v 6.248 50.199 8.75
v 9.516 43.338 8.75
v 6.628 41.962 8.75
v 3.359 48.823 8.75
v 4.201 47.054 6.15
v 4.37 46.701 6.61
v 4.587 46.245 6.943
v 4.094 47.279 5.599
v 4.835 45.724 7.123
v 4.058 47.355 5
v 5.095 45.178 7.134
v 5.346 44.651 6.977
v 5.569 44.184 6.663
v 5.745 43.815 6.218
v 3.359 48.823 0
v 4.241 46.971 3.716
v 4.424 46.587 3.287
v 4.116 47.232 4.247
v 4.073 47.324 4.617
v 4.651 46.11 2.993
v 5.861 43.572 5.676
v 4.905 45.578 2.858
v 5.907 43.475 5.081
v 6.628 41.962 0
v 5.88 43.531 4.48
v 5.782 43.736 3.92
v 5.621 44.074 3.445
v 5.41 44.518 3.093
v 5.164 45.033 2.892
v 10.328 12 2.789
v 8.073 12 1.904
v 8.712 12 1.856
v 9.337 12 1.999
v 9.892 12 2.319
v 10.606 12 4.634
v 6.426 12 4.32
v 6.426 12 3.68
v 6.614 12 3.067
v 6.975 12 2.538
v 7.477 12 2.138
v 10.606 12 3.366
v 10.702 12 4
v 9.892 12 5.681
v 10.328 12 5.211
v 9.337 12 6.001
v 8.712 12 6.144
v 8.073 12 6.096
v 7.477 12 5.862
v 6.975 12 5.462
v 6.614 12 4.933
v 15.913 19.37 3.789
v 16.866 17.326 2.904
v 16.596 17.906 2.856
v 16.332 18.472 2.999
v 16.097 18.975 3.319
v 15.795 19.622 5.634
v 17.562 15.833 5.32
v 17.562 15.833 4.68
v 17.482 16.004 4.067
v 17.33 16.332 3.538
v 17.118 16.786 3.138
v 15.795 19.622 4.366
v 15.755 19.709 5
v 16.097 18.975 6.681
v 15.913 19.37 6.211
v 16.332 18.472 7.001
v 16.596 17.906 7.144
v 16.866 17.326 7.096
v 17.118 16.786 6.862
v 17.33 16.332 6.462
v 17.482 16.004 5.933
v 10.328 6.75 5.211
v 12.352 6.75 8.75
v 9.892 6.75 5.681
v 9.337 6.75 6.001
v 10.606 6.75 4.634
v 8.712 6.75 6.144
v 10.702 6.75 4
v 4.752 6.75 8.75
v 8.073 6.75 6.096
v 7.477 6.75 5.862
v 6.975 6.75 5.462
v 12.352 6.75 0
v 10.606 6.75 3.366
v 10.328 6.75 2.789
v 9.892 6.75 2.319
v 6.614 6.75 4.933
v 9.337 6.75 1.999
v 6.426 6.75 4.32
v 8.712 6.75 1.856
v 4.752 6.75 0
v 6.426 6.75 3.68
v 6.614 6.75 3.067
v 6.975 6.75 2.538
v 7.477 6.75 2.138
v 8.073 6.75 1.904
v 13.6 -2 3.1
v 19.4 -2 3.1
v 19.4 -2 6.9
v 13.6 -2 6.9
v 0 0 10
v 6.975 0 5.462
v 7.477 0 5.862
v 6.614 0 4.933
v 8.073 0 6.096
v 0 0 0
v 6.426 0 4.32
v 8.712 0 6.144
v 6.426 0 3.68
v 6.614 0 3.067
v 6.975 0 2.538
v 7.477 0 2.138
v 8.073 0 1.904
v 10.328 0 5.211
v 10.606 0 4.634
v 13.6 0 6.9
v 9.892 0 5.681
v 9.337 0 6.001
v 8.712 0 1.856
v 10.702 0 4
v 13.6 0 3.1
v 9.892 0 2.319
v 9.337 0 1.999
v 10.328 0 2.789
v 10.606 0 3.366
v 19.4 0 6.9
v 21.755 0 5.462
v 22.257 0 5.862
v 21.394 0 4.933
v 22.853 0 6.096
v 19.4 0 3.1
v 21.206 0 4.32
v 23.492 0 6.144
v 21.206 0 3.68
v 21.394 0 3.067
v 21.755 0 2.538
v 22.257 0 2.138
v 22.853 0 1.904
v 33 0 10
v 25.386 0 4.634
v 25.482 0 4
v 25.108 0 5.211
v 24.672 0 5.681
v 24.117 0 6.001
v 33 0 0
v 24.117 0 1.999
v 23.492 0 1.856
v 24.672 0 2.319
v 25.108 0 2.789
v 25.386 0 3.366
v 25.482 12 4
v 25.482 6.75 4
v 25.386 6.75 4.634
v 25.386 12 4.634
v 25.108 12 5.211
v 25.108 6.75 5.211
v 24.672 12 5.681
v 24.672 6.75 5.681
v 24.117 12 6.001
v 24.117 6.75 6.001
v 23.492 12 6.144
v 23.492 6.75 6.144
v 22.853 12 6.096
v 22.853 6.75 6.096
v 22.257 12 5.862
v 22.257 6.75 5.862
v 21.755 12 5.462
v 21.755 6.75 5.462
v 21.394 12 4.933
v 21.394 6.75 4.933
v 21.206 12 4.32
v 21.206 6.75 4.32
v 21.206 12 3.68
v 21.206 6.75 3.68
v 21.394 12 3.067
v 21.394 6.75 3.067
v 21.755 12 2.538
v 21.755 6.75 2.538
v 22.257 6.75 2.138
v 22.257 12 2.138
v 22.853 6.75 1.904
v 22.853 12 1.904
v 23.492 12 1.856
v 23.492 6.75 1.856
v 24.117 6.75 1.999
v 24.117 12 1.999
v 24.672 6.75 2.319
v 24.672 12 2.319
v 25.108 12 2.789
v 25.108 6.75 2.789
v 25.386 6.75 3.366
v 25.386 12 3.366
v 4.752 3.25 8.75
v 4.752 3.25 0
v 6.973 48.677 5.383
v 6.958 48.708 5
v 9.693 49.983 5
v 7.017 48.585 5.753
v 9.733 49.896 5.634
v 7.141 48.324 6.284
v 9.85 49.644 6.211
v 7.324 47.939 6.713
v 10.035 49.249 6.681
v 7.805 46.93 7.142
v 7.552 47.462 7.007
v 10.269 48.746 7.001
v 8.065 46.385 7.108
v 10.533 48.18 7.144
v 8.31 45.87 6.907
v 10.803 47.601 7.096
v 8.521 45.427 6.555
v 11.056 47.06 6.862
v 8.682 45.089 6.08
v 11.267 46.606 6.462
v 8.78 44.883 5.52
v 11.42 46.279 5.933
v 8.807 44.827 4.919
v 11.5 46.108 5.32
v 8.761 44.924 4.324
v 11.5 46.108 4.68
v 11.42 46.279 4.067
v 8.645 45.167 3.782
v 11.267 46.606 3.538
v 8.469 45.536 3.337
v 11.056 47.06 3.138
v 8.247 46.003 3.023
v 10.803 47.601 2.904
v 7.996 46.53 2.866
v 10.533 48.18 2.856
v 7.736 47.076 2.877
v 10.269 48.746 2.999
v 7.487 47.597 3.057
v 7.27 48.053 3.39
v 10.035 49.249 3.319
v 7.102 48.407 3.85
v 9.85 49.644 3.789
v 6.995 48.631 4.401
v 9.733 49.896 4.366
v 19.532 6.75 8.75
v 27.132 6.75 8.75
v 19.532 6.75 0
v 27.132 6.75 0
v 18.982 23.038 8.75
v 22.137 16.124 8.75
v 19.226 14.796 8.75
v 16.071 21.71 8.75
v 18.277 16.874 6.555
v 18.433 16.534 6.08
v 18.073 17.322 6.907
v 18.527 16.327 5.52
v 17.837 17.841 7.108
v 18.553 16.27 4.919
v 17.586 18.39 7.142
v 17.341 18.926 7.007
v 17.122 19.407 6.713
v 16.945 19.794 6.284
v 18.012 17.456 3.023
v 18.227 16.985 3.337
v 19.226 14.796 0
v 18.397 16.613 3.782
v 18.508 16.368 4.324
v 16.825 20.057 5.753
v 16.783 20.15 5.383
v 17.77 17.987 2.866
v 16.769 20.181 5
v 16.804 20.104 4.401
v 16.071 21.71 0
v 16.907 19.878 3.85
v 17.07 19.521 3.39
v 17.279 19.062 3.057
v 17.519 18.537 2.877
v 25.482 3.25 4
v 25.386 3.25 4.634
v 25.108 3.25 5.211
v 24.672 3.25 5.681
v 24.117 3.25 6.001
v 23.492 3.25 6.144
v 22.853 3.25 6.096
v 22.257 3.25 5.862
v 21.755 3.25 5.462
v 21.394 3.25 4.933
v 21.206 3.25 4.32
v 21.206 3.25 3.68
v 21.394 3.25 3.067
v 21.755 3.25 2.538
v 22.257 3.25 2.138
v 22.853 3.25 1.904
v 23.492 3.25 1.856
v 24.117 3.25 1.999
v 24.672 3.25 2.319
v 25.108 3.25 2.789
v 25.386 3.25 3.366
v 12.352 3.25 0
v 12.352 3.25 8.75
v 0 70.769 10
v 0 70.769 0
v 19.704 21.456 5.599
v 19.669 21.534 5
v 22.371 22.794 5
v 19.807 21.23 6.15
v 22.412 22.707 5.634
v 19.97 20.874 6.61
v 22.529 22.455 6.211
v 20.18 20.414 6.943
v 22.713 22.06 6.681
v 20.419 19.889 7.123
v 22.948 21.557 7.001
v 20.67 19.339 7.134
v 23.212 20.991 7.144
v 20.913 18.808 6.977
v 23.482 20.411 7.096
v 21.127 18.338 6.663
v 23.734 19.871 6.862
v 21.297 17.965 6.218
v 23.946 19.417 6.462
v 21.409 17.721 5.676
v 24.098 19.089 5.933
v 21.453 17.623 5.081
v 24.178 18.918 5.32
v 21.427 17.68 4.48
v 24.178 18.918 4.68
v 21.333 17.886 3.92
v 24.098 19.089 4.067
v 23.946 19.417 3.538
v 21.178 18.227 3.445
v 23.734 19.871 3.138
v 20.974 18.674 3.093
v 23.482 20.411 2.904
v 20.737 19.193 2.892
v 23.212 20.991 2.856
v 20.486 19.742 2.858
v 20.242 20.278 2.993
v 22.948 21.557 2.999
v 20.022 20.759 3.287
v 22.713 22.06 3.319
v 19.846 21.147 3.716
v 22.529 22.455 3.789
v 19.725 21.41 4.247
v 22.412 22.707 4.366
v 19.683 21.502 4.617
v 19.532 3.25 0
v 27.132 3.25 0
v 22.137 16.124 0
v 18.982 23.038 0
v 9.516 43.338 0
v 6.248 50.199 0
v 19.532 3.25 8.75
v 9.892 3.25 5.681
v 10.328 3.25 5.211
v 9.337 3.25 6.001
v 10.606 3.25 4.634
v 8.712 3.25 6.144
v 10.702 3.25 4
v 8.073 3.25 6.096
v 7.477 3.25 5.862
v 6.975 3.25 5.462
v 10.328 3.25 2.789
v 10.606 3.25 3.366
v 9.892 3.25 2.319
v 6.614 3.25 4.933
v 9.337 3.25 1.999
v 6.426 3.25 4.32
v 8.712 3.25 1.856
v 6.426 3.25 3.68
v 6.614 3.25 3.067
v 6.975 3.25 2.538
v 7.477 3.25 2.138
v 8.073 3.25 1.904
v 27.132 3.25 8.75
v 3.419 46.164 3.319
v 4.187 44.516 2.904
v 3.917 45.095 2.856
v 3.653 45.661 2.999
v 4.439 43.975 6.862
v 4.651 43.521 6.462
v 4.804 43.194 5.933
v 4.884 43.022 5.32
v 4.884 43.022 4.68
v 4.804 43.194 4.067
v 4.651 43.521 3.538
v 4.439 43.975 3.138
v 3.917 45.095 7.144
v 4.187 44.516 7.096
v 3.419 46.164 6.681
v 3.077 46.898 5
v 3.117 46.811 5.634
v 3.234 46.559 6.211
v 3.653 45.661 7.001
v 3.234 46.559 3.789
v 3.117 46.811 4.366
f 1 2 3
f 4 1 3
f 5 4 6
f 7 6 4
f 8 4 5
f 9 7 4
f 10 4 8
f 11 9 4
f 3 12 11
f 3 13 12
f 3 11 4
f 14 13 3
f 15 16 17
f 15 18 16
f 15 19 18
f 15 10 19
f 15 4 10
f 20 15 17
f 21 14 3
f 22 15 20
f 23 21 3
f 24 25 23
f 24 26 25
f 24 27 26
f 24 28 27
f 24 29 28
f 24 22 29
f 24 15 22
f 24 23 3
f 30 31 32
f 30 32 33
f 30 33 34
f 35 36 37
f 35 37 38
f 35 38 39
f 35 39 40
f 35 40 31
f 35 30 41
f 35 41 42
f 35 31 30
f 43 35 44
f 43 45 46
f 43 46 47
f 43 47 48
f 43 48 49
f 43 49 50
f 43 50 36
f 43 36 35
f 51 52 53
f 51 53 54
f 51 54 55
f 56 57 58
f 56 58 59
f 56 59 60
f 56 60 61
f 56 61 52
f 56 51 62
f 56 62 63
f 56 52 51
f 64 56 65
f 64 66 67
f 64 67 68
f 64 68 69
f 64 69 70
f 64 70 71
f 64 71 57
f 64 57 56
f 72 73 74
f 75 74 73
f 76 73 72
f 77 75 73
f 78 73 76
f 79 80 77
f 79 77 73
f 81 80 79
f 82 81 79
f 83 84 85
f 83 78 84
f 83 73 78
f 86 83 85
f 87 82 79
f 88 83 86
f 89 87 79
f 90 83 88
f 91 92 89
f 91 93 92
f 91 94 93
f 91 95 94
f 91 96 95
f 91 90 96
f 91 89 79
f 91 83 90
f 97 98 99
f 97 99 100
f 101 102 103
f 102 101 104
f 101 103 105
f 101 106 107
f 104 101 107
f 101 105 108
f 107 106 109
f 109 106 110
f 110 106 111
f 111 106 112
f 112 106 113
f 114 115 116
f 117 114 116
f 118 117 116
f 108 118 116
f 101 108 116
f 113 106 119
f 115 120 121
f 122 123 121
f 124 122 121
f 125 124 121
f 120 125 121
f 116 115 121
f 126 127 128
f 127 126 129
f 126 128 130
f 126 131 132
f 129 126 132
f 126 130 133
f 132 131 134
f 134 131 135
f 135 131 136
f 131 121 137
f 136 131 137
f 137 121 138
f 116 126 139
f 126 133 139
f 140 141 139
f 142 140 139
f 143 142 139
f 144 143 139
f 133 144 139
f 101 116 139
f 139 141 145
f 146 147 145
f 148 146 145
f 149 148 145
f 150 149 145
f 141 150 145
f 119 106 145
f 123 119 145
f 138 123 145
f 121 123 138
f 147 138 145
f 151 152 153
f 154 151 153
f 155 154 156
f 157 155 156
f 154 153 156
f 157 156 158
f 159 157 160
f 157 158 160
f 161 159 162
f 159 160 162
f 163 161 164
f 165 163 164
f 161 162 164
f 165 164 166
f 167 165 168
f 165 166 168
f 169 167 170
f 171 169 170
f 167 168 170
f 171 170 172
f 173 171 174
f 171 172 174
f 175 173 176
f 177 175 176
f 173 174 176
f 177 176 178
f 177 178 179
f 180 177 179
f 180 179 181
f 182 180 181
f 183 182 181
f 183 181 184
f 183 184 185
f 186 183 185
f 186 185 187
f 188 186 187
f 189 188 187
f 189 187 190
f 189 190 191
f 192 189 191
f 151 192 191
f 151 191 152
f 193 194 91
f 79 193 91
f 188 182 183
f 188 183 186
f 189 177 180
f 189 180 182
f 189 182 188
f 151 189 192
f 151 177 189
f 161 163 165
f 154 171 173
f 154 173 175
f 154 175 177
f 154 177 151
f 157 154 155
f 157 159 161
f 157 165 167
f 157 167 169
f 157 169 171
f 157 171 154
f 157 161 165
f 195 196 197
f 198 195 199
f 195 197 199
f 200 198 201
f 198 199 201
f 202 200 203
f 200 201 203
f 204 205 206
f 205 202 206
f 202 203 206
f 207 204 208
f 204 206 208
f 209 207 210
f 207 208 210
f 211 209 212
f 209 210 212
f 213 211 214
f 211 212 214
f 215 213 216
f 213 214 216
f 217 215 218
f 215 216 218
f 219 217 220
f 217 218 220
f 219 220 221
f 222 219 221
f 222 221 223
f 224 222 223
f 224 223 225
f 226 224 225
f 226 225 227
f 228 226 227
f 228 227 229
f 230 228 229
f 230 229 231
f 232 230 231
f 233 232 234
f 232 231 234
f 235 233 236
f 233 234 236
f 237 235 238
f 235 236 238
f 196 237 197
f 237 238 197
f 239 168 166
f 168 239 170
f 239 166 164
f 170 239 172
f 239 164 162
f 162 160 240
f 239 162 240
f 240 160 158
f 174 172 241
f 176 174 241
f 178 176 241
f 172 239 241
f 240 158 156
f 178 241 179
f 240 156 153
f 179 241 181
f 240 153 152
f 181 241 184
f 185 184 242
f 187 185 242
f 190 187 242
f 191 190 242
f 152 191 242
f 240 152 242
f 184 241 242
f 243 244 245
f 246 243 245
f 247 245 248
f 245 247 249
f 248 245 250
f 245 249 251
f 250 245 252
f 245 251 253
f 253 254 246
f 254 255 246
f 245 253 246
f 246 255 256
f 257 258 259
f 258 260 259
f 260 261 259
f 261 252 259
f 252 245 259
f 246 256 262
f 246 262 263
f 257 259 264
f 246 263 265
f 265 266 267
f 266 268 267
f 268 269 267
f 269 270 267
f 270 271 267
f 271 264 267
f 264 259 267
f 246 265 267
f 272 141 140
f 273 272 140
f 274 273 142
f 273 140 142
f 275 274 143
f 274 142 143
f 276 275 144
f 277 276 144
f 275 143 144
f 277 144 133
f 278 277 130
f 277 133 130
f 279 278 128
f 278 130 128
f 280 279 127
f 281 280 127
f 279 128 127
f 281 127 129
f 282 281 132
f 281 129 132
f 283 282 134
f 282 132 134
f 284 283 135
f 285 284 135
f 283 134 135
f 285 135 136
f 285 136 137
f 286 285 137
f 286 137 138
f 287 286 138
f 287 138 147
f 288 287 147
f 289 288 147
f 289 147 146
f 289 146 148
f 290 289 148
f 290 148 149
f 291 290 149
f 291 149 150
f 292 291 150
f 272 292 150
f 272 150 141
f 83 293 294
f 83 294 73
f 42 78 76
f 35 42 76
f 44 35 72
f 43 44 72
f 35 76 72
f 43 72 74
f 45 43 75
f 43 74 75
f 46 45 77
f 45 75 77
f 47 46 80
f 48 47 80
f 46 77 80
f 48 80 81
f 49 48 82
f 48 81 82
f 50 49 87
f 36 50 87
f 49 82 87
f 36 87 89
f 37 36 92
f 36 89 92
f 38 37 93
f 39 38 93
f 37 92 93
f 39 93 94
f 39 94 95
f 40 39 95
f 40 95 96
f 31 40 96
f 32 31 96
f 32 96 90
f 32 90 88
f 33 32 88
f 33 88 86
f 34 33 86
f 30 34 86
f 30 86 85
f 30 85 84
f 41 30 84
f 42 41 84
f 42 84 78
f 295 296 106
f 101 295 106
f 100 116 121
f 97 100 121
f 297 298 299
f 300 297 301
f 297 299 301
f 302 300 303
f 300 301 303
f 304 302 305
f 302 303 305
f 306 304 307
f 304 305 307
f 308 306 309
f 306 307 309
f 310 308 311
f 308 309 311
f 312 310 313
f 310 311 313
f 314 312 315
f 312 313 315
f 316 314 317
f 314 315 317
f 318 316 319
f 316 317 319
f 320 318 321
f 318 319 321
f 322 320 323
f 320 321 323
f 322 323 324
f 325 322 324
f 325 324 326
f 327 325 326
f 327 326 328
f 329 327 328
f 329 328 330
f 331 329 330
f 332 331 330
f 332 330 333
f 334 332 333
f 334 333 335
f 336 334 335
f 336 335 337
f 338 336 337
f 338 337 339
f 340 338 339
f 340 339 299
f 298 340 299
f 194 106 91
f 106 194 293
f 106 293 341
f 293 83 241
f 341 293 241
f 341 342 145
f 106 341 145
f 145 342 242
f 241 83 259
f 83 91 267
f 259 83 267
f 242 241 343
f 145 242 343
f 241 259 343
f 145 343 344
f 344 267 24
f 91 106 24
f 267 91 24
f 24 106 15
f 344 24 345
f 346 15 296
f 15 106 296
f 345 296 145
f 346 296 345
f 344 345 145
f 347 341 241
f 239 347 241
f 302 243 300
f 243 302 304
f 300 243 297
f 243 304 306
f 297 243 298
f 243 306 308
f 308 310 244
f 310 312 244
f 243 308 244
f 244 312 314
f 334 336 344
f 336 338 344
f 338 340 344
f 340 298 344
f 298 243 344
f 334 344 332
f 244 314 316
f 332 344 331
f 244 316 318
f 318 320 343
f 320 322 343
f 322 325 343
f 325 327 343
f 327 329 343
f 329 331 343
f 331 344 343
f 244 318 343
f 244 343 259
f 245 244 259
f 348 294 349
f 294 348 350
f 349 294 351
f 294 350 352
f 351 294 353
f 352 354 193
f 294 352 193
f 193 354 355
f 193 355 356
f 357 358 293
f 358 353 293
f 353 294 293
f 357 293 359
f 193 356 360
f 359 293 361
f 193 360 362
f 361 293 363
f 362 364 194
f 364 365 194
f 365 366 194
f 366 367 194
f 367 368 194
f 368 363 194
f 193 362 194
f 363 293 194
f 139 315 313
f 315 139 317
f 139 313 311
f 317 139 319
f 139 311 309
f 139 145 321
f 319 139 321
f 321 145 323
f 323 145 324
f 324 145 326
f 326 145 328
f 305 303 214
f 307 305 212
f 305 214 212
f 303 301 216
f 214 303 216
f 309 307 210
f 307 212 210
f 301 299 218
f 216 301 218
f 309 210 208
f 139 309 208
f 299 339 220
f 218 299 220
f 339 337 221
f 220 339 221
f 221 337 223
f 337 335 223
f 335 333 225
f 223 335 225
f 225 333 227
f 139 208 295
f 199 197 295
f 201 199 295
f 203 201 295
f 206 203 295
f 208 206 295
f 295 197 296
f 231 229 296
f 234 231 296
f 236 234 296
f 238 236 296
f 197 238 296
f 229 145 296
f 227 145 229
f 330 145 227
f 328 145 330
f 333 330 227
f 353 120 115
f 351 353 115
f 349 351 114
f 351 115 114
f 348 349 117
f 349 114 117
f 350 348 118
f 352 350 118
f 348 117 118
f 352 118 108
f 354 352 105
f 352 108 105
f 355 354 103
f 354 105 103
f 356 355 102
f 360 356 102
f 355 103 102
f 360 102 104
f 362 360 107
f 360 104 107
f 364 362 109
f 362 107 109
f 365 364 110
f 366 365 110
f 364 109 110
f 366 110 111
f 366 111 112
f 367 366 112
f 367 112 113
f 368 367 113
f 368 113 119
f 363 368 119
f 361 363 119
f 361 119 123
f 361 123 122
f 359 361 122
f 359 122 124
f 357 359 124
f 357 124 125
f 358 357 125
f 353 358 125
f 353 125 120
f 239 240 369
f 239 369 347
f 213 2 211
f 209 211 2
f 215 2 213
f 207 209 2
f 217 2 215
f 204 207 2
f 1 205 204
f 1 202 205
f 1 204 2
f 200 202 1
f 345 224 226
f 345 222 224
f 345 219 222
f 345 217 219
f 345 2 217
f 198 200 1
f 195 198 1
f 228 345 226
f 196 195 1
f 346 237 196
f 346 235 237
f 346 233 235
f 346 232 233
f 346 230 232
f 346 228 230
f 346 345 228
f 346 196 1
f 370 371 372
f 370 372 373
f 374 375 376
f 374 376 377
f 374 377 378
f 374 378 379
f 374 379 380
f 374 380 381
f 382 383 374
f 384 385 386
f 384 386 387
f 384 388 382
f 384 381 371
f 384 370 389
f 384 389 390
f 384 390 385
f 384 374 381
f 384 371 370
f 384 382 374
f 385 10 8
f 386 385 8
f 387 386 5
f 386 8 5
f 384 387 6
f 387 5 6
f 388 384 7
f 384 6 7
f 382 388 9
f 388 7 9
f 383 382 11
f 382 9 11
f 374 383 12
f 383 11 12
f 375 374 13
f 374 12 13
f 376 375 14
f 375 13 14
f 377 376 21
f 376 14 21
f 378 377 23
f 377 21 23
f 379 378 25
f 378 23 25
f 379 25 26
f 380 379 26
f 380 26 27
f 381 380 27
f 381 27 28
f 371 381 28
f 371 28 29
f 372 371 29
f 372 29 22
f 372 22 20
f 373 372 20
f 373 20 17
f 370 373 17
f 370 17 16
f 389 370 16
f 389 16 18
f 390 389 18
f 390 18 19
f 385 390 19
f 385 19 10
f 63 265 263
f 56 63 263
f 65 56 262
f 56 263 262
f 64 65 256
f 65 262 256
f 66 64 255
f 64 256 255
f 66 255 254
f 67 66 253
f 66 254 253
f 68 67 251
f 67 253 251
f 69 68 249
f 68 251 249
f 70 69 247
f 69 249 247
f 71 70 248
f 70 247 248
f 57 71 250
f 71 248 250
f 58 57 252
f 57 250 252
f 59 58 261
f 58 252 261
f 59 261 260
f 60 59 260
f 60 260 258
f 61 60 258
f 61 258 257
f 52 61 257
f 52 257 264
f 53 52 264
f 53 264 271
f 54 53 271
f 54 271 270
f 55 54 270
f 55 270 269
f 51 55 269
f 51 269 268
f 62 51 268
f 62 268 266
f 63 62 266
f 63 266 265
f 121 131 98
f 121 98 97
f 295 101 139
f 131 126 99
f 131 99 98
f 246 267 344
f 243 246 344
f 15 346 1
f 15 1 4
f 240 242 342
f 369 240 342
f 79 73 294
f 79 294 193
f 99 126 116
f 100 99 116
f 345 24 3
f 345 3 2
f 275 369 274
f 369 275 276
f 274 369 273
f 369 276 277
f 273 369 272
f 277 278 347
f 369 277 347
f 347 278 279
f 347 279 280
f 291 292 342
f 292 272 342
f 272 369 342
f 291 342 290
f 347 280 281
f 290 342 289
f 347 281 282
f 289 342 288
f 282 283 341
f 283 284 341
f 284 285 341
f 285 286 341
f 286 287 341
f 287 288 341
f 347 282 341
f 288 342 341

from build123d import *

# Parameters (mm, degrees)
BOSS_EXTRUDE1_DEPTH = 10
SKETCH2_W           = 5.8
SKETCH2_H           = 3.8
BOSS_EXTRUDE2_DEPTH = 2
SKETCH3_R           = 2.15
CUT_EXTRUDE1_DEPTH  = 12
CUT_EXTRUDE2_DEPTH  = 6.5
SKETCH5_W           = 7.6
SKETCH5_H           = 3.5
CUT_EXTRUDE3_DEPTH  = 6.5
SKETCH6_R           = 2.15
CUT_EXTRUDE4_DEPTH  = 7.3
CUT_EXTRUDE5_START  = -10
CUT_EXTRUDE5_DEPTH  = 7.5
SKETCH8_W           = 7.6
SKETCH8_H           = 3.5
CUT_EXTRUDE6_DEPTH  = 8.75


with BuildPart() as part:
    # Sketch1 → Boss-Extrude1 (new body)
    with BuildSketch(Plane.XY):
        Polygon((0, 70.768728377), (0, 0), (33, 0), align=None)
    extrude(amount=BOSS_EXTRUDE1_DEPTH)

    # Sketch2 → Boss-Extrude2 (add)
    with BuildSketch(Plane(origin=(0, 0, 0), x_dir=(-1, 0, 0), z_dir=(0, -1, 0))):
        with Locations((-16.5, -5)):
            Rectangle(SKETCH2_W, SKETCH2_H)
    extrude(amount=BOSS_EXTRUDE2_DEPTH)

    # Sketch3 → Cut-Extrude1 (cut)
    with BuildSketch(Plane(origin=(0, 0, 0), x_dir=(-1, 0, 0), z_dir=(0, -1, 0))):
        with Locations(Location((-23.331538291, -4, 0), (0, 0, 180))):
            Circle(SKETCH3_R)
        with Locations(Location((-8.551538291, -4, 0), (0, 0, 180))):
            Circle(SKETCH3_R)
    extrude(amount=-CUT_EXTRUDE1_DEPTH, mode=Mode.SUBTRACT)

    # Sketch4 → Cut-Extrude2 (cut)
    with BuildSketch(Plane(origin=(0, 0, 0), x_dir=(-1, 0, 0), z_dir=(0, 0, -1))):
        Polygon((-19.531538291, 3.25), (-19.531538291, 5), (-19.531538291, 6.75), (-27.131538291, 6.75), (-27.131538291, 5), (-27.131538291, 3.25), align=None)
    extrude(amount=-CUT_EXTRUDE2_DEPTH, mode=Mode.SUBTRACT)

    # Sketch5 → Cut-Extrude3 (cut)
    with BuildSketch(Plane(origin=(0, 0, 0), x_dir=(-1, 0, 0), z_dir=(0, 0, -1))):
        with Locations((-23.331538291, 5)):
            Rectangle(SKETCH5_W, SKETCH5_H)
        with Locations((-8.551538291, 5)):
            Rectangle(SKETCH5_W, SKETCH5_H)
    extrude(amount=-CUT_EXTRUDE3_DEPTH, mode=Mode.SUBTRACT)

    # Sketch6 → Cut-Extrude4 (cut)
    with BuildSketch(Plane(origin=(27.10599556, 12.639733311, 0), x_dir=(0, 0, -1), z_dir=(0.9063077870366479, 0.422618261740704, 0))):
        with Locations(Location((-5, 9.053597363, 0), (0, 0, 90))):
            Circle(SKETCH6_R)
        with Locations(Location((-5, 39.053597363, 0), (0, 0, 90))):
            Circle(SKETCH6_R)
    extrude(amount=-CUT_EXTRUDE4_DEPTH, mode=Mode.SUBTRACT)

    # Sketch7 → Cut-Extrude5 (cut)
    with BuildSketch(Plane.XY.offset(10).offset(CUT_EXTRUDE5_START)):
        Polygon((6.247556837, 50.199361906), (3.358673988, 48.823005888), (6.627519532, 41.961909123), (9.51640238, 43.338265141), align=None)
        Polygon((18.982454602, 23.03825064), (22.13718624, 16.123941687), (19.225898259, 14.795633629), (16.071166622, 21.709942582), align=None)
    extrude(amount=CUT_EXTRUDE5_DEPTH, mode=Mode.SUBTRACT)

    # Sketch8 → Cut-Extrude6 (cut)
    with BuildSketch(Plane(origin=(0, 0, 0), x_dir=(-1, 0, 0), z_dir=(0, 0, -1))):
        with Locations((-23.331538291, 5)):
            Rectangle(SKETCH8_W, SKETCH8_H)
        with Locations((-8.551538291, 5)):
            Rectangle(SKETCH8_W, SKETCH8_H)
        Polygon((-22.13718624, 16.123941687), (-19.225898259, 14.795633629), (-16.071166622, 21.709942582), (-18.982454602, 23.03825064), align=None)
        Polygon((-9.51640238, 43.338265141), (-6.627519532, 41.961909123), (-3.358673988, 48.823005888), (-6.247556837, 50.199361906), align=None)
    extrude(amount=-CUT_EXTRUDE6_DEPTH, mode=Mode.SUBTRACT)


solid = part.part
